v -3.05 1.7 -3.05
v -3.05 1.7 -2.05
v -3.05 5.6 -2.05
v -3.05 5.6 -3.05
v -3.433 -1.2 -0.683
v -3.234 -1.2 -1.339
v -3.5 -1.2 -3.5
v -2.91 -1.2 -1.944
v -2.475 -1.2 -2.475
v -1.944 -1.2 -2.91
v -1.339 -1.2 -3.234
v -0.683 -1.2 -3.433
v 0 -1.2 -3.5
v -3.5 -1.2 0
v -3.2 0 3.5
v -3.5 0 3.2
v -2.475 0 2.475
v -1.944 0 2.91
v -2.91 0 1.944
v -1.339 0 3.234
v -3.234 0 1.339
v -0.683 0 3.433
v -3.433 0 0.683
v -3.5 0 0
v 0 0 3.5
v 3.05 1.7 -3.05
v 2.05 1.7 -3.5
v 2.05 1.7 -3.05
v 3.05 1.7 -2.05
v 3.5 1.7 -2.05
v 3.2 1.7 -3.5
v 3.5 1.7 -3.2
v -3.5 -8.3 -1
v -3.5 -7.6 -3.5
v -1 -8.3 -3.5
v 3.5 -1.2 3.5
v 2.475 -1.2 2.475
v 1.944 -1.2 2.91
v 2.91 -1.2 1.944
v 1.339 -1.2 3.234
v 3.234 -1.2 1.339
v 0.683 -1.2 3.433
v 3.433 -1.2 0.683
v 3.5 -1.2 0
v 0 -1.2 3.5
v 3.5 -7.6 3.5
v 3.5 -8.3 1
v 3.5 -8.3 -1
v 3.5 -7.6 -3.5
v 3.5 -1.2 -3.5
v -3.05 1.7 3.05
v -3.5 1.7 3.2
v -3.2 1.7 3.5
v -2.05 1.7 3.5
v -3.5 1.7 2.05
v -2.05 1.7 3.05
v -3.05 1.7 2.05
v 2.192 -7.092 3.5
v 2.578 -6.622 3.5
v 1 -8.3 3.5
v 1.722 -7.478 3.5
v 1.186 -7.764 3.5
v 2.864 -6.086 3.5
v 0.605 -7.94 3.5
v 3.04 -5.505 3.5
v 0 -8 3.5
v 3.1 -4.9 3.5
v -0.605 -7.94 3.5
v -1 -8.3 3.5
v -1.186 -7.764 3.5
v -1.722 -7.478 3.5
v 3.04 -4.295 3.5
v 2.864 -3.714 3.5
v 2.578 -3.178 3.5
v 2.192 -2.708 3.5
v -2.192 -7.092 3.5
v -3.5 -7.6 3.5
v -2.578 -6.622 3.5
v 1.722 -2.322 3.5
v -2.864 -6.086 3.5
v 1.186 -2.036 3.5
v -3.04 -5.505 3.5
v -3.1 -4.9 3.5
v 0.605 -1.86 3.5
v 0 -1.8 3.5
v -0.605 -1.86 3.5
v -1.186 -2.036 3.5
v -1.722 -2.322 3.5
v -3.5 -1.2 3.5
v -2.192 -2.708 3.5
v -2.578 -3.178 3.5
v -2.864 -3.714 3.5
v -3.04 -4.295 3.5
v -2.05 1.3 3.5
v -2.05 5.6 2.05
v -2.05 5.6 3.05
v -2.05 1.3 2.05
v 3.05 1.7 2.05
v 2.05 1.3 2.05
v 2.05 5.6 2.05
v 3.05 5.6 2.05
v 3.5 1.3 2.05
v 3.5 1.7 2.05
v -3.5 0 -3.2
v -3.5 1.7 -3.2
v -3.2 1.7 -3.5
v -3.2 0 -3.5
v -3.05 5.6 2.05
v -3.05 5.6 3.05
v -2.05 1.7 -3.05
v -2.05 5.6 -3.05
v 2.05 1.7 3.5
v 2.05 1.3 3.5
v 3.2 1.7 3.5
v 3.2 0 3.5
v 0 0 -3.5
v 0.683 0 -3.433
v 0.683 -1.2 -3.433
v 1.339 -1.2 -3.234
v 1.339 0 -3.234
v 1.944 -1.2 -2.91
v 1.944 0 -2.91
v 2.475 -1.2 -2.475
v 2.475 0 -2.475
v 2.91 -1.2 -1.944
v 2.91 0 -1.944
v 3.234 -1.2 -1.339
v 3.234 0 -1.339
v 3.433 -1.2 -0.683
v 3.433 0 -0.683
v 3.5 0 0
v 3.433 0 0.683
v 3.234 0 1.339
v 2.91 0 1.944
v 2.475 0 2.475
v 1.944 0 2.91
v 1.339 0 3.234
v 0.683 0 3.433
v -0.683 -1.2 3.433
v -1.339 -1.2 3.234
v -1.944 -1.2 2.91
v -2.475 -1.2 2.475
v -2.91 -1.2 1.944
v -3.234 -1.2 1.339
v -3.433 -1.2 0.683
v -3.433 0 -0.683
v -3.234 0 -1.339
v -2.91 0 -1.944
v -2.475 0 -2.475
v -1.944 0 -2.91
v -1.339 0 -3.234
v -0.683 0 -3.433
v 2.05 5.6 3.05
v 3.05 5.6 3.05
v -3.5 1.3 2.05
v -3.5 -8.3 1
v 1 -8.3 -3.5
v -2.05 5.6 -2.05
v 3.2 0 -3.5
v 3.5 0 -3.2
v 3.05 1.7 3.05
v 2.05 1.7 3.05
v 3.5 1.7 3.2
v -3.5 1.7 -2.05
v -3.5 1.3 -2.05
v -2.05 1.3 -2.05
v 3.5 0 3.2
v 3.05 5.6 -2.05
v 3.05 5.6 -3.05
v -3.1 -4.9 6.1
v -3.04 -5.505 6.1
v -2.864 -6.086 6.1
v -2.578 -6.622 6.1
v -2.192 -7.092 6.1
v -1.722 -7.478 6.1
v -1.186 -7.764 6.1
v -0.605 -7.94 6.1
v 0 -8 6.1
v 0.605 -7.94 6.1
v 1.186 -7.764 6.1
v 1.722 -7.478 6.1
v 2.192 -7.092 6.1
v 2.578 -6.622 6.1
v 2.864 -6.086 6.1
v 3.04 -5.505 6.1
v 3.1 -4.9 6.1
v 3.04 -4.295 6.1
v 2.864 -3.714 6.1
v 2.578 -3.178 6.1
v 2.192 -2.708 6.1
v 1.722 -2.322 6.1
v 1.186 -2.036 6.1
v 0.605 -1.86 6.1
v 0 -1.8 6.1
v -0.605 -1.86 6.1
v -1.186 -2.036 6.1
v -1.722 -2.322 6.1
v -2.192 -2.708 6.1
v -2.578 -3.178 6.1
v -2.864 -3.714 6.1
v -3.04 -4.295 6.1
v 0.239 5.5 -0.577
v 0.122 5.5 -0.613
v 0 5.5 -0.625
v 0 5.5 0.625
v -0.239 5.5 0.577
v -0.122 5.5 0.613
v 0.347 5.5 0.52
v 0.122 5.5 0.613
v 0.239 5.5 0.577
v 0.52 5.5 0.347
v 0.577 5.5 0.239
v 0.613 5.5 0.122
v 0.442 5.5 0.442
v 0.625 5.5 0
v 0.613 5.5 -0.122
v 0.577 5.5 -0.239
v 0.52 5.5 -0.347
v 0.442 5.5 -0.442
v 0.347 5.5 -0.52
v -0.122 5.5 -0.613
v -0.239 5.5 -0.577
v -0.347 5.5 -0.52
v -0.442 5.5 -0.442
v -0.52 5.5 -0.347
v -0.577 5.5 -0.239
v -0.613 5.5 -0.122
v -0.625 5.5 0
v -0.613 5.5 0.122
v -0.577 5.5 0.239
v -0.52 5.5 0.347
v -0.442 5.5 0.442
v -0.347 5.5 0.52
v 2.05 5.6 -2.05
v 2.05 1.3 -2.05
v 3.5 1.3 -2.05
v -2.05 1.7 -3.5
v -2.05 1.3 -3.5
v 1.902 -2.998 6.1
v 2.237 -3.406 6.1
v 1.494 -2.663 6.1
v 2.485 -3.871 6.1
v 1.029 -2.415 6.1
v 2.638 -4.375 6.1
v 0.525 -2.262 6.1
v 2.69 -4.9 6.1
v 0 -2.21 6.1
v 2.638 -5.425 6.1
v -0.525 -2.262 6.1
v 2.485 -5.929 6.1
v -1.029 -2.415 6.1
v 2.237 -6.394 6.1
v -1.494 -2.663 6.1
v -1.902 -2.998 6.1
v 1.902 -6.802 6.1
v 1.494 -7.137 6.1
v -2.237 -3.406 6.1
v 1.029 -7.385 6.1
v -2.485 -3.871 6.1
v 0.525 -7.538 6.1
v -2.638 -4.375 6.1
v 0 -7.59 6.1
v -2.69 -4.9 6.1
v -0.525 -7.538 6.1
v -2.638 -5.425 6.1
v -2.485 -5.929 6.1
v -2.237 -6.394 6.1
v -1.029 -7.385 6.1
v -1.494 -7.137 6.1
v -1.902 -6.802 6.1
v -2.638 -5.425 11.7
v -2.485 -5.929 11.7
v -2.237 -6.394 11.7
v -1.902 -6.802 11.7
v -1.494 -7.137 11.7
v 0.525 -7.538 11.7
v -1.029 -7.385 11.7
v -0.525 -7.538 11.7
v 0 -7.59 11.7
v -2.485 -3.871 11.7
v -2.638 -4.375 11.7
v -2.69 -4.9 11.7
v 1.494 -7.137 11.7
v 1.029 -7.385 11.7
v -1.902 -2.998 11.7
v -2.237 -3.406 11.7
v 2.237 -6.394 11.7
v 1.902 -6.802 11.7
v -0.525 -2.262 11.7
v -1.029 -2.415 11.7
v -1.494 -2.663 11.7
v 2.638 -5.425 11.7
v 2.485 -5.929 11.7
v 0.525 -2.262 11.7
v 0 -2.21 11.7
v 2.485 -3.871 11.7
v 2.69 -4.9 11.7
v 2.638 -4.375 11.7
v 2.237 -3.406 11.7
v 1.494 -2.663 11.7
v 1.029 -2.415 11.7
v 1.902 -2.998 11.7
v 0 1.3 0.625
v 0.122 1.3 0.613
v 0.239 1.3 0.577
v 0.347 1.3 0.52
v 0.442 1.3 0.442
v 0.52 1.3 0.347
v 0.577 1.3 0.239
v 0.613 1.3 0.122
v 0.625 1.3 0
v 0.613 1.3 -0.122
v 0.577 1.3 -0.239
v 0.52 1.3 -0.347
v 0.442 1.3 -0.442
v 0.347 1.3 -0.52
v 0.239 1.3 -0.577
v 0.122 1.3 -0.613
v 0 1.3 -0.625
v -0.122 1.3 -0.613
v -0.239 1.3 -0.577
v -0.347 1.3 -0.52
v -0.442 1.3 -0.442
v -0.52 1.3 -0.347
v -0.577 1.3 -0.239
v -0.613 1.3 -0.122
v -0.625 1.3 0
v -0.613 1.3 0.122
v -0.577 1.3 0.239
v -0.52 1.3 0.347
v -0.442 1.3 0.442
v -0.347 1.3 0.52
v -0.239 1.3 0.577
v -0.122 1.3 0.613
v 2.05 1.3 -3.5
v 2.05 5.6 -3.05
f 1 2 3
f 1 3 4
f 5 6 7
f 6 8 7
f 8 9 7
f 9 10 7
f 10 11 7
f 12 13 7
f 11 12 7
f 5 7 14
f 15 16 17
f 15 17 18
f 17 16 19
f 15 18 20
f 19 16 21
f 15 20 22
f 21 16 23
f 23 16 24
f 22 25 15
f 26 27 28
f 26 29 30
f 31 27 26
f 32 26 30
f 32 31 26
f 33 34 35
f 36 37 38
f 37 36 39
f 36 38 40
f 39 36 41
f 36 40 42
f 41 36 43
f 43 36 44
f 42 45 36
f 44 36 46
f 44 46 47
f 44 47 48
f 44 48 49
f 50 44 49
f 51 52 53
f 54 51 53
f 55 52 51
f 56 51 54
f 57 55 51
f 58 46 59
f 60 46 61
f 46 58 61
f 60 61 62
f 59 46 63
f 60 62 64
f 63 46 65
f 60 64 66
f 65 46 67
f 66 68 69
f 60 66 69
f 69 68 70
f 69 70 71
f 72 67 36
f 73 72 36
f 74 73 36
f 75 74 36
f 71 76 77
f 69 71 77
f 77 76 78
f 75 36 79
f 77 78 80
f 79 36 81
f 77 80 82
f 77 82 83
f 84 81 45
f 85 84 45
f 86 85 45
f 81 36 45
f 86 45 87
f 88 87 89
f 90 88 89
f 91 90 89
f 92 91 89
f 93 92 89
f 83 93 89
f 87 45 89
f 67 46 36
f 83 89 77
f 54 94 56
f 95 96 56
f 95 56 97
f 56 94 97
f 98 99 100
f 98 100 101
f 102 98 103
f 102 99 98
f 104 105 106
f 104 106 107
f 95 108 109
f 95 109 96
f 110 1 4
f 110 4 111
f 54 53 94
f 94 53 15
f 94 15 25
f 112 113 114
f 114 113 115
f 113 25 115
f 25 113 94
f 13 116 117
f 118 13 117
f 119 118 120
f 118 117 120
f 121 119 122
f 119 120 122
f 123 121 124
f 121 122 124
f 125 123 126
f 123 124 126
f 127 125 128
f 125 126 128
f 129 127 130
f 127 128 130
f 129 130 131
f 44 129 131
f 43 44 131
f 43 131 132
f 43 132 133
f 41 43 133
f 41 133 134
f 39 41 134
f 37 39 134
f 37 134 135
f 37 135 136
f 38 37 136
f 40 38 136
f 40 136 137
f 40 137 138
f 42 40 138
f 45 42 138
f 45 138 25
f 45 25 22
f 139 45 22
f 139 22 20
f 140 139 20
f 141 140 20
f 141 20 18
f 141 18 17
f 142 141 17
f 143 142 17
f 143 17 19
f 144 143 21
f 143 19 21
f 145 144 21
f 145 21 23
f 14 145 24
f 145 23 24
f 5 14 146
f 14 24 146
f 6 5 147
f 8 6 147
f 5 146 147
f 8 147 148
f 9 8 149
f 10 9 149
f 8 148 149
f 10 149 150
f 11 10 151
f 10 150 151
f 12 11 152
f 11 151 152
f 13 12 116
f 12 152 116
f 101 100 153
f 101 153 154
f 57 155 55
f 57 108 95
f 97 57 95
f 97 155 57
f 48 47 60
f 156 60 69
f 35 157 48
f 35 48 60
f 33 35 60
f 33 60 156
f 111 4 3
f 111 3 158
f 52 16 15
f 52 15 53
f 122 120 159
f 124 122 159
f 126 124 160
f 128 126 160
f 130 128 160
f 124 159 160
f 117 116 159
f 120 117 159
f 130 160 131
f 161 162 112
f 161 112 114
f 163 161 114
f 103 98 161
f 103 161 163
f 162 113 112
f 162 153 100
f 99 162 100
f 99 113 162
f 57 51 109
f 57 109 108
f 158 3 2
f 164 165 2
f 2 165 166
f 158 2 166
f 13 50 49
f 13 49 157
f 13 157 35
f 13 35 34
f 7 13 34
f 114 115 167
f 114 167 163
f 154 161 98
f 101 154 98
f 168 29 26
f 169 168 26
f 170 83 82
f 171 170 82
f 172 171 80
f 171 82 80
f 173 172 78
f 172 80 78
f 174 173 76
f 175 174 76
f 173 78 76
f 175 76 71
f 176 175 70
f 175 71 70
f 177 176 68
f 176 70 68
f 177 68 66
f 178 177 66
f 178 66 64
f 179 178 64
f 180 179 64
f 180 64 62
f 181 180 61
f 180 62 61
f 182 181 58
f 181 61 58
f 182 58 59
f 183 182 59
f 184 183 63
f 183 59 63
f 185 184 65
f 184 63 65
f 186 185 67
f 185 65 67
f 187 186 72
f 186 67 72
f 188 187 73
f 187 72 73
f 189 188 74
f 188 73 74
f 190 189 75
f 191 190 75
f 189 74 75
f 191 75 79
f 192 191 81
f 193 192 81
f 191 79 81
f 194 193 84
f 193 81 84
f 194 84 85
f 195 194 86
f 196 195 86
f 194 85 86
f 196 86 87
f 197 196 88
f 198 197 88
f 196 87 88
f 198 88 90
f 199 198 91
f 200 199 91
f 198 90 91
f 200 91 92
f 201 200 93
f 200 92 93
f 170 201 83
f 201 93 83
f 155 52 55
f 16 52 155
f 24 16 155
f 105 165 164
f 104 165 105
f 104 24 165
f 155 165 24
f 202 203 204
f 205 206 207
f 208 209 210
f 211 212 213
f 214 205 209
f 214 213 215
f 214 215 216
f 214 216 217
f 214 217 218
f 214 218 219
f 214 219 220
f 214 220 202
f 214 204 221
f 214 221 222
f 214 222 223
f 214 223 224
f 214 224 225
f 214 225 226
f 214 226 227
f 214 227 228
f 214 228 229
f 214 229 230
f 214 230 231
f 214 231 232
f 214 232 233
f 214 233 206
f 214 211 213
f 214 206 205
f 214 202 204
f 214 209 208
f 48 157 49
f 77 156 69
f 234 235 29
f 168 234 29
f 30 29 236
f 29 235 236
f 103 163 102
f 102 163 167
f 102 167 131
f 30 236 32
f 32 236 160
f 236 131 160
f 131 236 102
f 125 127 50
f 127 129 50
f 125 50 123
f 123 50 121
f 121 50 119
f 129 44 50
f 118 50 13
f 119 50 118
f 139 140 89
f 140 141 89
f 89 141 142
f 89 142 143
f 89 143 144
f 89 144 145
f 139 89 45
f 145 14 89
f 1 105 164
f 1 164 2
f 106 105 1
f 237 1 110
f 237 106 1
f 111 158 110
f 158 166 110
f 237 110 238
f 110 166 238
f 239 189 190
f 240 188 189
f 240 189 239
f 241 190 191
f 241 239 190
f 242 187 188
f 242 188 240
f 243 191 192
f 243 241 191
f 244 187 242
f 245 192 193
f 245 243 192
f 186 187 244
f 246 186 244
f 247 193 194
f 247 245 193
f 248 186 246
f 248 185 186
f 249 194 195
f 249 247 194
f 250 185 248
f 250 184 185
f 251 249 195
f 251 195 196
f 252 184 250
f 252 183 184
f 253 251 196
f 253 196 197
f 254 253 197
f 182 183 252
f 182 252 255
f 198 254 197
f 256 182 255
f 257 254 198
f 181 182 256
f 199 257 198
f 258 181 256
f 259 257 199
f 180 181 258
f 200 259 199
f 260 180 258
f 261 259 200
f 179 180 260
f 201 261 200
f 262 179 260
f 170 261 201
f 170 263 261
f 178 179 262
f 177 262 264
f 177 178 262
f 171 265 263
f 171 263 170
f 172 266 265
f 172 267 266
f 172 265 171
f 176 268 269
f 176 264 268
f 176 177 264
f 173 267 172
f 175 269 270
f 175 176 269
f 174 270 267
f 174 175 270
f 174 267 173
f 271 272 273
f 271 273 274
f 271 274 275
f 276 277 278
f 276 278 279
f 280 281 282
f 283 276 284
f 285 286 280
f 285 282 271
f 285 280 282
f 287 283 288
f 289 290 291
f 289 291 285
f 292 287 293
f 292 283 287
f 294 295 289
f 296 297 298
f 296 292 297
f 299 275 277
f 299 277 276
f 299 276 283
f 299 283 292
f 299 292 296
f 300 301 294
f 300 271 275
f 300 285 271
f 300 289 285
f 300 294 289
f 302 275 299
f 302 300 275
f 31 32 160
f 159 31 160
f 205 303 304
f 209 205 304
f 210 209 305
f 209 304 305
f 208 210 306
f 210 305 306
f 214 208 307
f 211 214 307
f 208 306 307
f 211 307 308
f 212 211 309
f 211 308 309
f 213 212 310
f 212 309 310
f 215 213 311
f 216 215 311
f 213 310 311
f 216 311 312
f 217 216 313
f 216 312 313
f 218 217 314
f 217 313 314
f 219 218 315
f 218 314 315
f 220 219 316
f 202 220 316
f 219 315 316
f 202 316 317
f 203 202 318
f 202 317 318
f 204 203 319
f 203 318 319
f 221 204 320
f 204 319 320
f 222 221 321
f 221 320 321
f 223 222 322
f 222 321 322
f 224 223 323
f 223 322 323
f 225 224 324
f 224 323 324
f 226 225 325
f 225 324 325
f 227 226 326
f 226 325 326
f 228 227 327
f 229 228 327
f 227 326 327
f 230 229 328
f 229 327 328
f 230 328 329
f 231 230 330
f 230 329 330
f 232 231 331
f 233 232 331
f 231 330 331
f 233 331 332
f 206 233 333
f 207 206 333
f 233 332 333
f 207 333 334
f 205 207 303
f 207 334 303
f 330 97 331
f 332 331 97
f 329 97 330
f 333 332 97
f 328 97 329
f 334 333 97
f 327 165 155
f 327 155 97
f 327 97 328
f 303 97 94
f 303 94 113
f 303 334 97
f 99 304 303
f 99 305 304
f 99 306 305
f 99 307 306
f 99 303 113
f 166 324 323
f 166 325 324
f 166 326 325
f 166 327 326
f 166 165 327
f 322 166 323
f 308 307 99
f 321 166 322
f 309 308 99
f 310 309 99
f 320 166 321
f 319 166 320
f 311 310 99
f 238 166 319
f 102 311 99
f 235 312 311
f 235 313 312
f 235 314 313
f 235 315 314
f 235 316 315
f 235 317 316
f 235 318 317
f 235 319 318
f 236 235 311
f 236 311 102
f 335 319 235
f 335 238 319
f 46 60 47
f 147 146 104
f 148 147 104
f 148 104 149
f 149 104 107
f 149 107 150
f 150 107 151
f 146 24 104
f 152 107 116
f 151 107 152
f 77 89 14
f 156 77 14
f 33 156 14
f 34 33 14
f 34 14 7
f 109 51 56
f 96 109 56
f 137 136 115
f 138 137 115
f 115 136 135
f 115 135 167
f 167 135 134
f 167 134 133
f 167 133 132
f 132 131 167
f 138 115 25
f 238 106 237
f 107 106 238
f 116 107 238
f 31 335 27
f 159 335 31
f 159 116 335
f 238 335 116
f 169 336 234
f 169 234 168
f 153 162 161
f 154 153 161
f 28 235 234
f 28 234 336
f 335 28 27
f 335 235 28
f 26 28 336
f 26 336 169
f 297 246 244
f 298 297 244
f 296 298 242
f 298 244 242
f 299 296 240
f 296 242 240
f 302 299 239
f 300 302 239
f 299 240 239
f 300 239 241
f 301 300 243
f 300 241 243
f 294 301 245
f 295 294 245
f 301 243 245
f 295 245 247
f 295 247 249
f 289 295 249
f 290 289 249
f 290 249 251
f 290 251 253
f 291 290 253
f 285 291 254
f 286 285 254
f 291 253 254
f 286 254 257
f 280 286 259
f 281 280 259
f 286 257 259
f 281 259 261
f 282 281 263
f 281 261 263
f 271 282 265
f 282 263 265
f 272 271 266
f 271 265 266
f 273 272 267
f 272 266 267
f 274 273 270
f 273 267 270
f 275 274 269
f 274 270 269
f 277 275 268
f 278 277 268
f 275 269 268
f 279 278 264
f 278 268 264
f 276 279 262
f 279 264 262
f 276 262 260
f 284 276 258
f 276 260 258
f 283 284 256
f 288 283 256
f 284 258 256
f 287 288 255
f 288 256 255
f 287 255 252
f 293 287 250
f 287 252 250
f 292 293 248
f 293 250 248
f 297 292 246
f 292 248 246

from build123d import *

# Parameters (mm, degrees)
SKETCH1_W           = 7
SKETCH1_H           = 7
BOSS_EXTRUDE1_DEPTH = 1.3
SKETCH2_W           = 1.45
SKETCH2_H           = 1.45
BOSS_EXTRUDE2_DEPTH = 0.4
SKETCH3_W           = 1
SKETCH3_H           = 1
BOSS_EXTRUDE3_DEPTH = 3.9
SKETCH4_R           = 0.625
BOSS_EXTRUDE4_DEPTH = 4.2
SKETCH5_R           = 3.5
BOSS_EXTRUDE5_DEPTH = 1.2
SKETCH6_W           = 7
SKETCH6_H           = 7
BOSS_EXTRUDE6_DEPTH = 7.1
CHAMFER1_START      = 8.88850564
CHAMFER1_OUTLINE_W  = 6
CHAMFER1_OUTLINE_H  = 6
CHAMFER1_DEPTH      = 2.11149436
CHAMFER2_START      = -11
CHAMFER2_OUTLINE_W  = 6
CHAMFER2_OUTLINE_H  = 6
CHAMFER2_DEPTH      = 2.11149436
CHAMFER3_START      = 8.88850564
CHAMFER3_OUTLINE_W  = 6
CHAMFER3_OUTLINE_H  = 6
CHAMFER3_DEPTH      = 2.11149436
CHAMFER4_START      = -11
CHAMFER4_OUTLINE_W  = 6
CHAMFER4_OUTLINE_H  = 6
CHAMFER4_DEPTH      = 2.11149436
CHAMFER5_SIZE       = 0.3
SKETCH7_R           = 3.1
BOSS_EXTRUDE7_DEPTH = 2.6
SKETCH8_R           = 2.68986
BOSS_EXTRUDE8_DEPTH = 5.6


with BuildPart() as part:
    # Sketch1 → Boss-Extrude1 (new body)
    with BuildSketch(Plane(origin=(0, 0, 0), x_dir=(1, 0, 0), z_dir=(0, 1, 0))):
        Rectangle(SKETCH1_W, SKETCH1_H)
    extrude(amount=BOSS_EXTRUDE1_DEPTH)

    # Sketch2 → Boss-Extrude2 (add)
    with BuildSketch(Plane(origin=(0, 1.3, 0), x_dir=(1, 0, 0), z_dir=(0, 1, 0))):
        with Locations((-2.775, 2.775)):
            Rectangle(SKETCH2_W, SKETCH2_H)
        with Locations((2.775, 2.775)):
            Rectangle(SKETCH2_W, SKETCH2_H)
        with Locations((2.775, -2.775)):
            Rectangle(SKETCH2_W, SKETCH2_H)
        with Locations((-2.775, -2.775)):
            Rectangle(SKETCH2_W, SKETCH2_H)
    extrude(amount=BOSS_EXTRUDE2_DEPTH)

    # Sketch3 → Boss-Extrude3 (add)
    with BuildSketch(Plane(origin=(0, 1.7, 0), x_dir=(1, 0, 0), z_dir=(0, 1, 0))):
        with Locations((-2.55, 2.55)):
            Rectangle(SKETCH3_W, SKETCH3_H)
        with Locations((-2.55, -2.55)):
            Rectangle(SKETCH3_W, SKETCH3_H)
        with Locations((2.55, -2.55)):
            Rectangle(SKETCH3_W, SKETCH3_H)
        with Locations((2.55, 2.55)):
            Rectangle(SKETCH3_W, SKETCH3_H)
    extrude(amount=BOSS_EXTRUDE3_DEPTH)

    # Sketch4 → Boss-Extrude4 (add)
    with BuildSketch(Plane(origin=(0, 1.3, 0), x_dir=(1, 0, 0), z_dir=(0, 1, 0))):
        with Locations(Location((0, 0, 0), (0, 0, 270))):
            Circle(SKETCH4_R)
    extrude(amount=BOSS_EXTRUDE4_DEPTH)

    # Sketch5 → Boss-Extrude5 (add)
    with BuildSketch(Plane(origin=(0, 0, 0), x_dir=(-1, 0, 0), z_dir=(0, -1, 0))):
        with Locations(Location((0, 0, 0), (0, 0, 90))):
            Circle(SKETCH5_R)
    extrude(amount=BOSS_EXTRUDE5_DEPTH)

    # Sketch6 → Boss-Extrude6 (add)
    with BuildSketch(Plane(origin=(0, -1.2, 0), x_dir=(-1, 0, 0), z_dir=(0, -1, 0))):
        Rectangle(SKETCH6_W, SKETCH6_H)
    extrude(amount=BOSS_EXTRUDE6_DEPTH)

    # Chamfer1: read off the stored shape, not the designer's step
    # Chamfer1 outline → Chamfer1 (cut)
    with BuildSketch(Plane(origin=(0, 0, 0), x_dir=(0.9655189447347837, 0.25069112066556, 0.07019351378635694), z_dir=(0.26033280115696106, -0.9297600041320021, -0.26033280115696106)).offset(CHAMFER1_START)):
        Rectangle(CHAMFER1_OUTLINE_W, CHAMFER1_OUTLINE_H)
    extrude(amount=CHAMFER1_DEPTH, mode=Mode.SUBTRACT)

    # Chamfer2: read off the stored shape, not the designer's step
    # Chamfer2 outline → Chamfer2 (cut)
    with BuildSketch(Plane(origin=(0, 0, 0), x_dir=(0.9655189447347837, -0.25069112066556, -0.07019351378635694), z_dir=(0.26033280115696106, 0.9297600041320021, 0.26033280115696106)).offset(CHAMFER2_START)):
        Rectangle(CHAMFER2_OUTLINE_W, CHAMFER2_OUTLINE_H)
    extrude(amount=CHAMFER2_DEPTH, mode=Mode.SUBTRACT)

    # Chamfer3: read off the stored shape, not the designer's step
    # Chamfer3 outline → Chamfer3 (cut)
    with BuildSketch(Plane(origin=(0, 0, 0), x_dir=(0.9655189447347837, 0.25069112066556, -0.07019351378635694), z_dir=(0.26033280115696106, -0.9297600041320021, 0.26033280115696106)).offset(CHAMFER3_START)):
        Rectangle(CHAMFER3_OUTLINE_W, CHAMFER3_OUTLINE_H)
    extrude(amount=CHAMFER3_DEPTH, mode=Mode.SUBTRACT)

    # Chamfer4: read off the stored shape, not the designer's step
    # Chamfer4 outline → Chamfer4 (cut)
    with BuildSketch(Plane(origin=(0, 0, 0), x_dir=(0.9655189447347837, -0.25069112066556, 0.07019351378635694), z_dir=(0.26033280115696106, 0.9297600041320021, -0.26033280115696106)).offset(CHAMFER4_START)):
        Rectangle(CHAMFER4_OUTLINE_W, CHAMFER4_OUTLINE_H)
    extrude(amount=CHAMFER4_DEPTH, mode=Mode.SUBTRACT)

    # Chamfer5
    chamfer5_edges = [part.edges().sort_by_distance(p)[0] for p in [
        (3.5, 0.85, 3.5),
        (-3.5, 0.85, 3.5),
        (-3.5, 0.85, -3.5),
        (3.5, 0.85, -3.5),
    ]]
    chamfer(chamfer5_edges, length=CHAMFER5_SIZE)

    # Sketch7 → Boss-Extrude7 (add)
    with BuildSketch(Plane.XY.offset(3.5)):
        with Locations(Location((0, -4.9, 0), (0, 0, 180))):
            Circle(SKETCH7_R)
    extrude(amount=BOSS_EXTRUDE7_DEPTH)

    # Sketch8 → Boss-Extrude8 (add)
    with BuildSketch(Plane.XY.offset(6.1)):
        with Locations((0, -4.9)):
            Circle(SKETCH8_R)
    extrude(amount=BOSS_EXTRUDE8_DEPTH)


solid = part.part
